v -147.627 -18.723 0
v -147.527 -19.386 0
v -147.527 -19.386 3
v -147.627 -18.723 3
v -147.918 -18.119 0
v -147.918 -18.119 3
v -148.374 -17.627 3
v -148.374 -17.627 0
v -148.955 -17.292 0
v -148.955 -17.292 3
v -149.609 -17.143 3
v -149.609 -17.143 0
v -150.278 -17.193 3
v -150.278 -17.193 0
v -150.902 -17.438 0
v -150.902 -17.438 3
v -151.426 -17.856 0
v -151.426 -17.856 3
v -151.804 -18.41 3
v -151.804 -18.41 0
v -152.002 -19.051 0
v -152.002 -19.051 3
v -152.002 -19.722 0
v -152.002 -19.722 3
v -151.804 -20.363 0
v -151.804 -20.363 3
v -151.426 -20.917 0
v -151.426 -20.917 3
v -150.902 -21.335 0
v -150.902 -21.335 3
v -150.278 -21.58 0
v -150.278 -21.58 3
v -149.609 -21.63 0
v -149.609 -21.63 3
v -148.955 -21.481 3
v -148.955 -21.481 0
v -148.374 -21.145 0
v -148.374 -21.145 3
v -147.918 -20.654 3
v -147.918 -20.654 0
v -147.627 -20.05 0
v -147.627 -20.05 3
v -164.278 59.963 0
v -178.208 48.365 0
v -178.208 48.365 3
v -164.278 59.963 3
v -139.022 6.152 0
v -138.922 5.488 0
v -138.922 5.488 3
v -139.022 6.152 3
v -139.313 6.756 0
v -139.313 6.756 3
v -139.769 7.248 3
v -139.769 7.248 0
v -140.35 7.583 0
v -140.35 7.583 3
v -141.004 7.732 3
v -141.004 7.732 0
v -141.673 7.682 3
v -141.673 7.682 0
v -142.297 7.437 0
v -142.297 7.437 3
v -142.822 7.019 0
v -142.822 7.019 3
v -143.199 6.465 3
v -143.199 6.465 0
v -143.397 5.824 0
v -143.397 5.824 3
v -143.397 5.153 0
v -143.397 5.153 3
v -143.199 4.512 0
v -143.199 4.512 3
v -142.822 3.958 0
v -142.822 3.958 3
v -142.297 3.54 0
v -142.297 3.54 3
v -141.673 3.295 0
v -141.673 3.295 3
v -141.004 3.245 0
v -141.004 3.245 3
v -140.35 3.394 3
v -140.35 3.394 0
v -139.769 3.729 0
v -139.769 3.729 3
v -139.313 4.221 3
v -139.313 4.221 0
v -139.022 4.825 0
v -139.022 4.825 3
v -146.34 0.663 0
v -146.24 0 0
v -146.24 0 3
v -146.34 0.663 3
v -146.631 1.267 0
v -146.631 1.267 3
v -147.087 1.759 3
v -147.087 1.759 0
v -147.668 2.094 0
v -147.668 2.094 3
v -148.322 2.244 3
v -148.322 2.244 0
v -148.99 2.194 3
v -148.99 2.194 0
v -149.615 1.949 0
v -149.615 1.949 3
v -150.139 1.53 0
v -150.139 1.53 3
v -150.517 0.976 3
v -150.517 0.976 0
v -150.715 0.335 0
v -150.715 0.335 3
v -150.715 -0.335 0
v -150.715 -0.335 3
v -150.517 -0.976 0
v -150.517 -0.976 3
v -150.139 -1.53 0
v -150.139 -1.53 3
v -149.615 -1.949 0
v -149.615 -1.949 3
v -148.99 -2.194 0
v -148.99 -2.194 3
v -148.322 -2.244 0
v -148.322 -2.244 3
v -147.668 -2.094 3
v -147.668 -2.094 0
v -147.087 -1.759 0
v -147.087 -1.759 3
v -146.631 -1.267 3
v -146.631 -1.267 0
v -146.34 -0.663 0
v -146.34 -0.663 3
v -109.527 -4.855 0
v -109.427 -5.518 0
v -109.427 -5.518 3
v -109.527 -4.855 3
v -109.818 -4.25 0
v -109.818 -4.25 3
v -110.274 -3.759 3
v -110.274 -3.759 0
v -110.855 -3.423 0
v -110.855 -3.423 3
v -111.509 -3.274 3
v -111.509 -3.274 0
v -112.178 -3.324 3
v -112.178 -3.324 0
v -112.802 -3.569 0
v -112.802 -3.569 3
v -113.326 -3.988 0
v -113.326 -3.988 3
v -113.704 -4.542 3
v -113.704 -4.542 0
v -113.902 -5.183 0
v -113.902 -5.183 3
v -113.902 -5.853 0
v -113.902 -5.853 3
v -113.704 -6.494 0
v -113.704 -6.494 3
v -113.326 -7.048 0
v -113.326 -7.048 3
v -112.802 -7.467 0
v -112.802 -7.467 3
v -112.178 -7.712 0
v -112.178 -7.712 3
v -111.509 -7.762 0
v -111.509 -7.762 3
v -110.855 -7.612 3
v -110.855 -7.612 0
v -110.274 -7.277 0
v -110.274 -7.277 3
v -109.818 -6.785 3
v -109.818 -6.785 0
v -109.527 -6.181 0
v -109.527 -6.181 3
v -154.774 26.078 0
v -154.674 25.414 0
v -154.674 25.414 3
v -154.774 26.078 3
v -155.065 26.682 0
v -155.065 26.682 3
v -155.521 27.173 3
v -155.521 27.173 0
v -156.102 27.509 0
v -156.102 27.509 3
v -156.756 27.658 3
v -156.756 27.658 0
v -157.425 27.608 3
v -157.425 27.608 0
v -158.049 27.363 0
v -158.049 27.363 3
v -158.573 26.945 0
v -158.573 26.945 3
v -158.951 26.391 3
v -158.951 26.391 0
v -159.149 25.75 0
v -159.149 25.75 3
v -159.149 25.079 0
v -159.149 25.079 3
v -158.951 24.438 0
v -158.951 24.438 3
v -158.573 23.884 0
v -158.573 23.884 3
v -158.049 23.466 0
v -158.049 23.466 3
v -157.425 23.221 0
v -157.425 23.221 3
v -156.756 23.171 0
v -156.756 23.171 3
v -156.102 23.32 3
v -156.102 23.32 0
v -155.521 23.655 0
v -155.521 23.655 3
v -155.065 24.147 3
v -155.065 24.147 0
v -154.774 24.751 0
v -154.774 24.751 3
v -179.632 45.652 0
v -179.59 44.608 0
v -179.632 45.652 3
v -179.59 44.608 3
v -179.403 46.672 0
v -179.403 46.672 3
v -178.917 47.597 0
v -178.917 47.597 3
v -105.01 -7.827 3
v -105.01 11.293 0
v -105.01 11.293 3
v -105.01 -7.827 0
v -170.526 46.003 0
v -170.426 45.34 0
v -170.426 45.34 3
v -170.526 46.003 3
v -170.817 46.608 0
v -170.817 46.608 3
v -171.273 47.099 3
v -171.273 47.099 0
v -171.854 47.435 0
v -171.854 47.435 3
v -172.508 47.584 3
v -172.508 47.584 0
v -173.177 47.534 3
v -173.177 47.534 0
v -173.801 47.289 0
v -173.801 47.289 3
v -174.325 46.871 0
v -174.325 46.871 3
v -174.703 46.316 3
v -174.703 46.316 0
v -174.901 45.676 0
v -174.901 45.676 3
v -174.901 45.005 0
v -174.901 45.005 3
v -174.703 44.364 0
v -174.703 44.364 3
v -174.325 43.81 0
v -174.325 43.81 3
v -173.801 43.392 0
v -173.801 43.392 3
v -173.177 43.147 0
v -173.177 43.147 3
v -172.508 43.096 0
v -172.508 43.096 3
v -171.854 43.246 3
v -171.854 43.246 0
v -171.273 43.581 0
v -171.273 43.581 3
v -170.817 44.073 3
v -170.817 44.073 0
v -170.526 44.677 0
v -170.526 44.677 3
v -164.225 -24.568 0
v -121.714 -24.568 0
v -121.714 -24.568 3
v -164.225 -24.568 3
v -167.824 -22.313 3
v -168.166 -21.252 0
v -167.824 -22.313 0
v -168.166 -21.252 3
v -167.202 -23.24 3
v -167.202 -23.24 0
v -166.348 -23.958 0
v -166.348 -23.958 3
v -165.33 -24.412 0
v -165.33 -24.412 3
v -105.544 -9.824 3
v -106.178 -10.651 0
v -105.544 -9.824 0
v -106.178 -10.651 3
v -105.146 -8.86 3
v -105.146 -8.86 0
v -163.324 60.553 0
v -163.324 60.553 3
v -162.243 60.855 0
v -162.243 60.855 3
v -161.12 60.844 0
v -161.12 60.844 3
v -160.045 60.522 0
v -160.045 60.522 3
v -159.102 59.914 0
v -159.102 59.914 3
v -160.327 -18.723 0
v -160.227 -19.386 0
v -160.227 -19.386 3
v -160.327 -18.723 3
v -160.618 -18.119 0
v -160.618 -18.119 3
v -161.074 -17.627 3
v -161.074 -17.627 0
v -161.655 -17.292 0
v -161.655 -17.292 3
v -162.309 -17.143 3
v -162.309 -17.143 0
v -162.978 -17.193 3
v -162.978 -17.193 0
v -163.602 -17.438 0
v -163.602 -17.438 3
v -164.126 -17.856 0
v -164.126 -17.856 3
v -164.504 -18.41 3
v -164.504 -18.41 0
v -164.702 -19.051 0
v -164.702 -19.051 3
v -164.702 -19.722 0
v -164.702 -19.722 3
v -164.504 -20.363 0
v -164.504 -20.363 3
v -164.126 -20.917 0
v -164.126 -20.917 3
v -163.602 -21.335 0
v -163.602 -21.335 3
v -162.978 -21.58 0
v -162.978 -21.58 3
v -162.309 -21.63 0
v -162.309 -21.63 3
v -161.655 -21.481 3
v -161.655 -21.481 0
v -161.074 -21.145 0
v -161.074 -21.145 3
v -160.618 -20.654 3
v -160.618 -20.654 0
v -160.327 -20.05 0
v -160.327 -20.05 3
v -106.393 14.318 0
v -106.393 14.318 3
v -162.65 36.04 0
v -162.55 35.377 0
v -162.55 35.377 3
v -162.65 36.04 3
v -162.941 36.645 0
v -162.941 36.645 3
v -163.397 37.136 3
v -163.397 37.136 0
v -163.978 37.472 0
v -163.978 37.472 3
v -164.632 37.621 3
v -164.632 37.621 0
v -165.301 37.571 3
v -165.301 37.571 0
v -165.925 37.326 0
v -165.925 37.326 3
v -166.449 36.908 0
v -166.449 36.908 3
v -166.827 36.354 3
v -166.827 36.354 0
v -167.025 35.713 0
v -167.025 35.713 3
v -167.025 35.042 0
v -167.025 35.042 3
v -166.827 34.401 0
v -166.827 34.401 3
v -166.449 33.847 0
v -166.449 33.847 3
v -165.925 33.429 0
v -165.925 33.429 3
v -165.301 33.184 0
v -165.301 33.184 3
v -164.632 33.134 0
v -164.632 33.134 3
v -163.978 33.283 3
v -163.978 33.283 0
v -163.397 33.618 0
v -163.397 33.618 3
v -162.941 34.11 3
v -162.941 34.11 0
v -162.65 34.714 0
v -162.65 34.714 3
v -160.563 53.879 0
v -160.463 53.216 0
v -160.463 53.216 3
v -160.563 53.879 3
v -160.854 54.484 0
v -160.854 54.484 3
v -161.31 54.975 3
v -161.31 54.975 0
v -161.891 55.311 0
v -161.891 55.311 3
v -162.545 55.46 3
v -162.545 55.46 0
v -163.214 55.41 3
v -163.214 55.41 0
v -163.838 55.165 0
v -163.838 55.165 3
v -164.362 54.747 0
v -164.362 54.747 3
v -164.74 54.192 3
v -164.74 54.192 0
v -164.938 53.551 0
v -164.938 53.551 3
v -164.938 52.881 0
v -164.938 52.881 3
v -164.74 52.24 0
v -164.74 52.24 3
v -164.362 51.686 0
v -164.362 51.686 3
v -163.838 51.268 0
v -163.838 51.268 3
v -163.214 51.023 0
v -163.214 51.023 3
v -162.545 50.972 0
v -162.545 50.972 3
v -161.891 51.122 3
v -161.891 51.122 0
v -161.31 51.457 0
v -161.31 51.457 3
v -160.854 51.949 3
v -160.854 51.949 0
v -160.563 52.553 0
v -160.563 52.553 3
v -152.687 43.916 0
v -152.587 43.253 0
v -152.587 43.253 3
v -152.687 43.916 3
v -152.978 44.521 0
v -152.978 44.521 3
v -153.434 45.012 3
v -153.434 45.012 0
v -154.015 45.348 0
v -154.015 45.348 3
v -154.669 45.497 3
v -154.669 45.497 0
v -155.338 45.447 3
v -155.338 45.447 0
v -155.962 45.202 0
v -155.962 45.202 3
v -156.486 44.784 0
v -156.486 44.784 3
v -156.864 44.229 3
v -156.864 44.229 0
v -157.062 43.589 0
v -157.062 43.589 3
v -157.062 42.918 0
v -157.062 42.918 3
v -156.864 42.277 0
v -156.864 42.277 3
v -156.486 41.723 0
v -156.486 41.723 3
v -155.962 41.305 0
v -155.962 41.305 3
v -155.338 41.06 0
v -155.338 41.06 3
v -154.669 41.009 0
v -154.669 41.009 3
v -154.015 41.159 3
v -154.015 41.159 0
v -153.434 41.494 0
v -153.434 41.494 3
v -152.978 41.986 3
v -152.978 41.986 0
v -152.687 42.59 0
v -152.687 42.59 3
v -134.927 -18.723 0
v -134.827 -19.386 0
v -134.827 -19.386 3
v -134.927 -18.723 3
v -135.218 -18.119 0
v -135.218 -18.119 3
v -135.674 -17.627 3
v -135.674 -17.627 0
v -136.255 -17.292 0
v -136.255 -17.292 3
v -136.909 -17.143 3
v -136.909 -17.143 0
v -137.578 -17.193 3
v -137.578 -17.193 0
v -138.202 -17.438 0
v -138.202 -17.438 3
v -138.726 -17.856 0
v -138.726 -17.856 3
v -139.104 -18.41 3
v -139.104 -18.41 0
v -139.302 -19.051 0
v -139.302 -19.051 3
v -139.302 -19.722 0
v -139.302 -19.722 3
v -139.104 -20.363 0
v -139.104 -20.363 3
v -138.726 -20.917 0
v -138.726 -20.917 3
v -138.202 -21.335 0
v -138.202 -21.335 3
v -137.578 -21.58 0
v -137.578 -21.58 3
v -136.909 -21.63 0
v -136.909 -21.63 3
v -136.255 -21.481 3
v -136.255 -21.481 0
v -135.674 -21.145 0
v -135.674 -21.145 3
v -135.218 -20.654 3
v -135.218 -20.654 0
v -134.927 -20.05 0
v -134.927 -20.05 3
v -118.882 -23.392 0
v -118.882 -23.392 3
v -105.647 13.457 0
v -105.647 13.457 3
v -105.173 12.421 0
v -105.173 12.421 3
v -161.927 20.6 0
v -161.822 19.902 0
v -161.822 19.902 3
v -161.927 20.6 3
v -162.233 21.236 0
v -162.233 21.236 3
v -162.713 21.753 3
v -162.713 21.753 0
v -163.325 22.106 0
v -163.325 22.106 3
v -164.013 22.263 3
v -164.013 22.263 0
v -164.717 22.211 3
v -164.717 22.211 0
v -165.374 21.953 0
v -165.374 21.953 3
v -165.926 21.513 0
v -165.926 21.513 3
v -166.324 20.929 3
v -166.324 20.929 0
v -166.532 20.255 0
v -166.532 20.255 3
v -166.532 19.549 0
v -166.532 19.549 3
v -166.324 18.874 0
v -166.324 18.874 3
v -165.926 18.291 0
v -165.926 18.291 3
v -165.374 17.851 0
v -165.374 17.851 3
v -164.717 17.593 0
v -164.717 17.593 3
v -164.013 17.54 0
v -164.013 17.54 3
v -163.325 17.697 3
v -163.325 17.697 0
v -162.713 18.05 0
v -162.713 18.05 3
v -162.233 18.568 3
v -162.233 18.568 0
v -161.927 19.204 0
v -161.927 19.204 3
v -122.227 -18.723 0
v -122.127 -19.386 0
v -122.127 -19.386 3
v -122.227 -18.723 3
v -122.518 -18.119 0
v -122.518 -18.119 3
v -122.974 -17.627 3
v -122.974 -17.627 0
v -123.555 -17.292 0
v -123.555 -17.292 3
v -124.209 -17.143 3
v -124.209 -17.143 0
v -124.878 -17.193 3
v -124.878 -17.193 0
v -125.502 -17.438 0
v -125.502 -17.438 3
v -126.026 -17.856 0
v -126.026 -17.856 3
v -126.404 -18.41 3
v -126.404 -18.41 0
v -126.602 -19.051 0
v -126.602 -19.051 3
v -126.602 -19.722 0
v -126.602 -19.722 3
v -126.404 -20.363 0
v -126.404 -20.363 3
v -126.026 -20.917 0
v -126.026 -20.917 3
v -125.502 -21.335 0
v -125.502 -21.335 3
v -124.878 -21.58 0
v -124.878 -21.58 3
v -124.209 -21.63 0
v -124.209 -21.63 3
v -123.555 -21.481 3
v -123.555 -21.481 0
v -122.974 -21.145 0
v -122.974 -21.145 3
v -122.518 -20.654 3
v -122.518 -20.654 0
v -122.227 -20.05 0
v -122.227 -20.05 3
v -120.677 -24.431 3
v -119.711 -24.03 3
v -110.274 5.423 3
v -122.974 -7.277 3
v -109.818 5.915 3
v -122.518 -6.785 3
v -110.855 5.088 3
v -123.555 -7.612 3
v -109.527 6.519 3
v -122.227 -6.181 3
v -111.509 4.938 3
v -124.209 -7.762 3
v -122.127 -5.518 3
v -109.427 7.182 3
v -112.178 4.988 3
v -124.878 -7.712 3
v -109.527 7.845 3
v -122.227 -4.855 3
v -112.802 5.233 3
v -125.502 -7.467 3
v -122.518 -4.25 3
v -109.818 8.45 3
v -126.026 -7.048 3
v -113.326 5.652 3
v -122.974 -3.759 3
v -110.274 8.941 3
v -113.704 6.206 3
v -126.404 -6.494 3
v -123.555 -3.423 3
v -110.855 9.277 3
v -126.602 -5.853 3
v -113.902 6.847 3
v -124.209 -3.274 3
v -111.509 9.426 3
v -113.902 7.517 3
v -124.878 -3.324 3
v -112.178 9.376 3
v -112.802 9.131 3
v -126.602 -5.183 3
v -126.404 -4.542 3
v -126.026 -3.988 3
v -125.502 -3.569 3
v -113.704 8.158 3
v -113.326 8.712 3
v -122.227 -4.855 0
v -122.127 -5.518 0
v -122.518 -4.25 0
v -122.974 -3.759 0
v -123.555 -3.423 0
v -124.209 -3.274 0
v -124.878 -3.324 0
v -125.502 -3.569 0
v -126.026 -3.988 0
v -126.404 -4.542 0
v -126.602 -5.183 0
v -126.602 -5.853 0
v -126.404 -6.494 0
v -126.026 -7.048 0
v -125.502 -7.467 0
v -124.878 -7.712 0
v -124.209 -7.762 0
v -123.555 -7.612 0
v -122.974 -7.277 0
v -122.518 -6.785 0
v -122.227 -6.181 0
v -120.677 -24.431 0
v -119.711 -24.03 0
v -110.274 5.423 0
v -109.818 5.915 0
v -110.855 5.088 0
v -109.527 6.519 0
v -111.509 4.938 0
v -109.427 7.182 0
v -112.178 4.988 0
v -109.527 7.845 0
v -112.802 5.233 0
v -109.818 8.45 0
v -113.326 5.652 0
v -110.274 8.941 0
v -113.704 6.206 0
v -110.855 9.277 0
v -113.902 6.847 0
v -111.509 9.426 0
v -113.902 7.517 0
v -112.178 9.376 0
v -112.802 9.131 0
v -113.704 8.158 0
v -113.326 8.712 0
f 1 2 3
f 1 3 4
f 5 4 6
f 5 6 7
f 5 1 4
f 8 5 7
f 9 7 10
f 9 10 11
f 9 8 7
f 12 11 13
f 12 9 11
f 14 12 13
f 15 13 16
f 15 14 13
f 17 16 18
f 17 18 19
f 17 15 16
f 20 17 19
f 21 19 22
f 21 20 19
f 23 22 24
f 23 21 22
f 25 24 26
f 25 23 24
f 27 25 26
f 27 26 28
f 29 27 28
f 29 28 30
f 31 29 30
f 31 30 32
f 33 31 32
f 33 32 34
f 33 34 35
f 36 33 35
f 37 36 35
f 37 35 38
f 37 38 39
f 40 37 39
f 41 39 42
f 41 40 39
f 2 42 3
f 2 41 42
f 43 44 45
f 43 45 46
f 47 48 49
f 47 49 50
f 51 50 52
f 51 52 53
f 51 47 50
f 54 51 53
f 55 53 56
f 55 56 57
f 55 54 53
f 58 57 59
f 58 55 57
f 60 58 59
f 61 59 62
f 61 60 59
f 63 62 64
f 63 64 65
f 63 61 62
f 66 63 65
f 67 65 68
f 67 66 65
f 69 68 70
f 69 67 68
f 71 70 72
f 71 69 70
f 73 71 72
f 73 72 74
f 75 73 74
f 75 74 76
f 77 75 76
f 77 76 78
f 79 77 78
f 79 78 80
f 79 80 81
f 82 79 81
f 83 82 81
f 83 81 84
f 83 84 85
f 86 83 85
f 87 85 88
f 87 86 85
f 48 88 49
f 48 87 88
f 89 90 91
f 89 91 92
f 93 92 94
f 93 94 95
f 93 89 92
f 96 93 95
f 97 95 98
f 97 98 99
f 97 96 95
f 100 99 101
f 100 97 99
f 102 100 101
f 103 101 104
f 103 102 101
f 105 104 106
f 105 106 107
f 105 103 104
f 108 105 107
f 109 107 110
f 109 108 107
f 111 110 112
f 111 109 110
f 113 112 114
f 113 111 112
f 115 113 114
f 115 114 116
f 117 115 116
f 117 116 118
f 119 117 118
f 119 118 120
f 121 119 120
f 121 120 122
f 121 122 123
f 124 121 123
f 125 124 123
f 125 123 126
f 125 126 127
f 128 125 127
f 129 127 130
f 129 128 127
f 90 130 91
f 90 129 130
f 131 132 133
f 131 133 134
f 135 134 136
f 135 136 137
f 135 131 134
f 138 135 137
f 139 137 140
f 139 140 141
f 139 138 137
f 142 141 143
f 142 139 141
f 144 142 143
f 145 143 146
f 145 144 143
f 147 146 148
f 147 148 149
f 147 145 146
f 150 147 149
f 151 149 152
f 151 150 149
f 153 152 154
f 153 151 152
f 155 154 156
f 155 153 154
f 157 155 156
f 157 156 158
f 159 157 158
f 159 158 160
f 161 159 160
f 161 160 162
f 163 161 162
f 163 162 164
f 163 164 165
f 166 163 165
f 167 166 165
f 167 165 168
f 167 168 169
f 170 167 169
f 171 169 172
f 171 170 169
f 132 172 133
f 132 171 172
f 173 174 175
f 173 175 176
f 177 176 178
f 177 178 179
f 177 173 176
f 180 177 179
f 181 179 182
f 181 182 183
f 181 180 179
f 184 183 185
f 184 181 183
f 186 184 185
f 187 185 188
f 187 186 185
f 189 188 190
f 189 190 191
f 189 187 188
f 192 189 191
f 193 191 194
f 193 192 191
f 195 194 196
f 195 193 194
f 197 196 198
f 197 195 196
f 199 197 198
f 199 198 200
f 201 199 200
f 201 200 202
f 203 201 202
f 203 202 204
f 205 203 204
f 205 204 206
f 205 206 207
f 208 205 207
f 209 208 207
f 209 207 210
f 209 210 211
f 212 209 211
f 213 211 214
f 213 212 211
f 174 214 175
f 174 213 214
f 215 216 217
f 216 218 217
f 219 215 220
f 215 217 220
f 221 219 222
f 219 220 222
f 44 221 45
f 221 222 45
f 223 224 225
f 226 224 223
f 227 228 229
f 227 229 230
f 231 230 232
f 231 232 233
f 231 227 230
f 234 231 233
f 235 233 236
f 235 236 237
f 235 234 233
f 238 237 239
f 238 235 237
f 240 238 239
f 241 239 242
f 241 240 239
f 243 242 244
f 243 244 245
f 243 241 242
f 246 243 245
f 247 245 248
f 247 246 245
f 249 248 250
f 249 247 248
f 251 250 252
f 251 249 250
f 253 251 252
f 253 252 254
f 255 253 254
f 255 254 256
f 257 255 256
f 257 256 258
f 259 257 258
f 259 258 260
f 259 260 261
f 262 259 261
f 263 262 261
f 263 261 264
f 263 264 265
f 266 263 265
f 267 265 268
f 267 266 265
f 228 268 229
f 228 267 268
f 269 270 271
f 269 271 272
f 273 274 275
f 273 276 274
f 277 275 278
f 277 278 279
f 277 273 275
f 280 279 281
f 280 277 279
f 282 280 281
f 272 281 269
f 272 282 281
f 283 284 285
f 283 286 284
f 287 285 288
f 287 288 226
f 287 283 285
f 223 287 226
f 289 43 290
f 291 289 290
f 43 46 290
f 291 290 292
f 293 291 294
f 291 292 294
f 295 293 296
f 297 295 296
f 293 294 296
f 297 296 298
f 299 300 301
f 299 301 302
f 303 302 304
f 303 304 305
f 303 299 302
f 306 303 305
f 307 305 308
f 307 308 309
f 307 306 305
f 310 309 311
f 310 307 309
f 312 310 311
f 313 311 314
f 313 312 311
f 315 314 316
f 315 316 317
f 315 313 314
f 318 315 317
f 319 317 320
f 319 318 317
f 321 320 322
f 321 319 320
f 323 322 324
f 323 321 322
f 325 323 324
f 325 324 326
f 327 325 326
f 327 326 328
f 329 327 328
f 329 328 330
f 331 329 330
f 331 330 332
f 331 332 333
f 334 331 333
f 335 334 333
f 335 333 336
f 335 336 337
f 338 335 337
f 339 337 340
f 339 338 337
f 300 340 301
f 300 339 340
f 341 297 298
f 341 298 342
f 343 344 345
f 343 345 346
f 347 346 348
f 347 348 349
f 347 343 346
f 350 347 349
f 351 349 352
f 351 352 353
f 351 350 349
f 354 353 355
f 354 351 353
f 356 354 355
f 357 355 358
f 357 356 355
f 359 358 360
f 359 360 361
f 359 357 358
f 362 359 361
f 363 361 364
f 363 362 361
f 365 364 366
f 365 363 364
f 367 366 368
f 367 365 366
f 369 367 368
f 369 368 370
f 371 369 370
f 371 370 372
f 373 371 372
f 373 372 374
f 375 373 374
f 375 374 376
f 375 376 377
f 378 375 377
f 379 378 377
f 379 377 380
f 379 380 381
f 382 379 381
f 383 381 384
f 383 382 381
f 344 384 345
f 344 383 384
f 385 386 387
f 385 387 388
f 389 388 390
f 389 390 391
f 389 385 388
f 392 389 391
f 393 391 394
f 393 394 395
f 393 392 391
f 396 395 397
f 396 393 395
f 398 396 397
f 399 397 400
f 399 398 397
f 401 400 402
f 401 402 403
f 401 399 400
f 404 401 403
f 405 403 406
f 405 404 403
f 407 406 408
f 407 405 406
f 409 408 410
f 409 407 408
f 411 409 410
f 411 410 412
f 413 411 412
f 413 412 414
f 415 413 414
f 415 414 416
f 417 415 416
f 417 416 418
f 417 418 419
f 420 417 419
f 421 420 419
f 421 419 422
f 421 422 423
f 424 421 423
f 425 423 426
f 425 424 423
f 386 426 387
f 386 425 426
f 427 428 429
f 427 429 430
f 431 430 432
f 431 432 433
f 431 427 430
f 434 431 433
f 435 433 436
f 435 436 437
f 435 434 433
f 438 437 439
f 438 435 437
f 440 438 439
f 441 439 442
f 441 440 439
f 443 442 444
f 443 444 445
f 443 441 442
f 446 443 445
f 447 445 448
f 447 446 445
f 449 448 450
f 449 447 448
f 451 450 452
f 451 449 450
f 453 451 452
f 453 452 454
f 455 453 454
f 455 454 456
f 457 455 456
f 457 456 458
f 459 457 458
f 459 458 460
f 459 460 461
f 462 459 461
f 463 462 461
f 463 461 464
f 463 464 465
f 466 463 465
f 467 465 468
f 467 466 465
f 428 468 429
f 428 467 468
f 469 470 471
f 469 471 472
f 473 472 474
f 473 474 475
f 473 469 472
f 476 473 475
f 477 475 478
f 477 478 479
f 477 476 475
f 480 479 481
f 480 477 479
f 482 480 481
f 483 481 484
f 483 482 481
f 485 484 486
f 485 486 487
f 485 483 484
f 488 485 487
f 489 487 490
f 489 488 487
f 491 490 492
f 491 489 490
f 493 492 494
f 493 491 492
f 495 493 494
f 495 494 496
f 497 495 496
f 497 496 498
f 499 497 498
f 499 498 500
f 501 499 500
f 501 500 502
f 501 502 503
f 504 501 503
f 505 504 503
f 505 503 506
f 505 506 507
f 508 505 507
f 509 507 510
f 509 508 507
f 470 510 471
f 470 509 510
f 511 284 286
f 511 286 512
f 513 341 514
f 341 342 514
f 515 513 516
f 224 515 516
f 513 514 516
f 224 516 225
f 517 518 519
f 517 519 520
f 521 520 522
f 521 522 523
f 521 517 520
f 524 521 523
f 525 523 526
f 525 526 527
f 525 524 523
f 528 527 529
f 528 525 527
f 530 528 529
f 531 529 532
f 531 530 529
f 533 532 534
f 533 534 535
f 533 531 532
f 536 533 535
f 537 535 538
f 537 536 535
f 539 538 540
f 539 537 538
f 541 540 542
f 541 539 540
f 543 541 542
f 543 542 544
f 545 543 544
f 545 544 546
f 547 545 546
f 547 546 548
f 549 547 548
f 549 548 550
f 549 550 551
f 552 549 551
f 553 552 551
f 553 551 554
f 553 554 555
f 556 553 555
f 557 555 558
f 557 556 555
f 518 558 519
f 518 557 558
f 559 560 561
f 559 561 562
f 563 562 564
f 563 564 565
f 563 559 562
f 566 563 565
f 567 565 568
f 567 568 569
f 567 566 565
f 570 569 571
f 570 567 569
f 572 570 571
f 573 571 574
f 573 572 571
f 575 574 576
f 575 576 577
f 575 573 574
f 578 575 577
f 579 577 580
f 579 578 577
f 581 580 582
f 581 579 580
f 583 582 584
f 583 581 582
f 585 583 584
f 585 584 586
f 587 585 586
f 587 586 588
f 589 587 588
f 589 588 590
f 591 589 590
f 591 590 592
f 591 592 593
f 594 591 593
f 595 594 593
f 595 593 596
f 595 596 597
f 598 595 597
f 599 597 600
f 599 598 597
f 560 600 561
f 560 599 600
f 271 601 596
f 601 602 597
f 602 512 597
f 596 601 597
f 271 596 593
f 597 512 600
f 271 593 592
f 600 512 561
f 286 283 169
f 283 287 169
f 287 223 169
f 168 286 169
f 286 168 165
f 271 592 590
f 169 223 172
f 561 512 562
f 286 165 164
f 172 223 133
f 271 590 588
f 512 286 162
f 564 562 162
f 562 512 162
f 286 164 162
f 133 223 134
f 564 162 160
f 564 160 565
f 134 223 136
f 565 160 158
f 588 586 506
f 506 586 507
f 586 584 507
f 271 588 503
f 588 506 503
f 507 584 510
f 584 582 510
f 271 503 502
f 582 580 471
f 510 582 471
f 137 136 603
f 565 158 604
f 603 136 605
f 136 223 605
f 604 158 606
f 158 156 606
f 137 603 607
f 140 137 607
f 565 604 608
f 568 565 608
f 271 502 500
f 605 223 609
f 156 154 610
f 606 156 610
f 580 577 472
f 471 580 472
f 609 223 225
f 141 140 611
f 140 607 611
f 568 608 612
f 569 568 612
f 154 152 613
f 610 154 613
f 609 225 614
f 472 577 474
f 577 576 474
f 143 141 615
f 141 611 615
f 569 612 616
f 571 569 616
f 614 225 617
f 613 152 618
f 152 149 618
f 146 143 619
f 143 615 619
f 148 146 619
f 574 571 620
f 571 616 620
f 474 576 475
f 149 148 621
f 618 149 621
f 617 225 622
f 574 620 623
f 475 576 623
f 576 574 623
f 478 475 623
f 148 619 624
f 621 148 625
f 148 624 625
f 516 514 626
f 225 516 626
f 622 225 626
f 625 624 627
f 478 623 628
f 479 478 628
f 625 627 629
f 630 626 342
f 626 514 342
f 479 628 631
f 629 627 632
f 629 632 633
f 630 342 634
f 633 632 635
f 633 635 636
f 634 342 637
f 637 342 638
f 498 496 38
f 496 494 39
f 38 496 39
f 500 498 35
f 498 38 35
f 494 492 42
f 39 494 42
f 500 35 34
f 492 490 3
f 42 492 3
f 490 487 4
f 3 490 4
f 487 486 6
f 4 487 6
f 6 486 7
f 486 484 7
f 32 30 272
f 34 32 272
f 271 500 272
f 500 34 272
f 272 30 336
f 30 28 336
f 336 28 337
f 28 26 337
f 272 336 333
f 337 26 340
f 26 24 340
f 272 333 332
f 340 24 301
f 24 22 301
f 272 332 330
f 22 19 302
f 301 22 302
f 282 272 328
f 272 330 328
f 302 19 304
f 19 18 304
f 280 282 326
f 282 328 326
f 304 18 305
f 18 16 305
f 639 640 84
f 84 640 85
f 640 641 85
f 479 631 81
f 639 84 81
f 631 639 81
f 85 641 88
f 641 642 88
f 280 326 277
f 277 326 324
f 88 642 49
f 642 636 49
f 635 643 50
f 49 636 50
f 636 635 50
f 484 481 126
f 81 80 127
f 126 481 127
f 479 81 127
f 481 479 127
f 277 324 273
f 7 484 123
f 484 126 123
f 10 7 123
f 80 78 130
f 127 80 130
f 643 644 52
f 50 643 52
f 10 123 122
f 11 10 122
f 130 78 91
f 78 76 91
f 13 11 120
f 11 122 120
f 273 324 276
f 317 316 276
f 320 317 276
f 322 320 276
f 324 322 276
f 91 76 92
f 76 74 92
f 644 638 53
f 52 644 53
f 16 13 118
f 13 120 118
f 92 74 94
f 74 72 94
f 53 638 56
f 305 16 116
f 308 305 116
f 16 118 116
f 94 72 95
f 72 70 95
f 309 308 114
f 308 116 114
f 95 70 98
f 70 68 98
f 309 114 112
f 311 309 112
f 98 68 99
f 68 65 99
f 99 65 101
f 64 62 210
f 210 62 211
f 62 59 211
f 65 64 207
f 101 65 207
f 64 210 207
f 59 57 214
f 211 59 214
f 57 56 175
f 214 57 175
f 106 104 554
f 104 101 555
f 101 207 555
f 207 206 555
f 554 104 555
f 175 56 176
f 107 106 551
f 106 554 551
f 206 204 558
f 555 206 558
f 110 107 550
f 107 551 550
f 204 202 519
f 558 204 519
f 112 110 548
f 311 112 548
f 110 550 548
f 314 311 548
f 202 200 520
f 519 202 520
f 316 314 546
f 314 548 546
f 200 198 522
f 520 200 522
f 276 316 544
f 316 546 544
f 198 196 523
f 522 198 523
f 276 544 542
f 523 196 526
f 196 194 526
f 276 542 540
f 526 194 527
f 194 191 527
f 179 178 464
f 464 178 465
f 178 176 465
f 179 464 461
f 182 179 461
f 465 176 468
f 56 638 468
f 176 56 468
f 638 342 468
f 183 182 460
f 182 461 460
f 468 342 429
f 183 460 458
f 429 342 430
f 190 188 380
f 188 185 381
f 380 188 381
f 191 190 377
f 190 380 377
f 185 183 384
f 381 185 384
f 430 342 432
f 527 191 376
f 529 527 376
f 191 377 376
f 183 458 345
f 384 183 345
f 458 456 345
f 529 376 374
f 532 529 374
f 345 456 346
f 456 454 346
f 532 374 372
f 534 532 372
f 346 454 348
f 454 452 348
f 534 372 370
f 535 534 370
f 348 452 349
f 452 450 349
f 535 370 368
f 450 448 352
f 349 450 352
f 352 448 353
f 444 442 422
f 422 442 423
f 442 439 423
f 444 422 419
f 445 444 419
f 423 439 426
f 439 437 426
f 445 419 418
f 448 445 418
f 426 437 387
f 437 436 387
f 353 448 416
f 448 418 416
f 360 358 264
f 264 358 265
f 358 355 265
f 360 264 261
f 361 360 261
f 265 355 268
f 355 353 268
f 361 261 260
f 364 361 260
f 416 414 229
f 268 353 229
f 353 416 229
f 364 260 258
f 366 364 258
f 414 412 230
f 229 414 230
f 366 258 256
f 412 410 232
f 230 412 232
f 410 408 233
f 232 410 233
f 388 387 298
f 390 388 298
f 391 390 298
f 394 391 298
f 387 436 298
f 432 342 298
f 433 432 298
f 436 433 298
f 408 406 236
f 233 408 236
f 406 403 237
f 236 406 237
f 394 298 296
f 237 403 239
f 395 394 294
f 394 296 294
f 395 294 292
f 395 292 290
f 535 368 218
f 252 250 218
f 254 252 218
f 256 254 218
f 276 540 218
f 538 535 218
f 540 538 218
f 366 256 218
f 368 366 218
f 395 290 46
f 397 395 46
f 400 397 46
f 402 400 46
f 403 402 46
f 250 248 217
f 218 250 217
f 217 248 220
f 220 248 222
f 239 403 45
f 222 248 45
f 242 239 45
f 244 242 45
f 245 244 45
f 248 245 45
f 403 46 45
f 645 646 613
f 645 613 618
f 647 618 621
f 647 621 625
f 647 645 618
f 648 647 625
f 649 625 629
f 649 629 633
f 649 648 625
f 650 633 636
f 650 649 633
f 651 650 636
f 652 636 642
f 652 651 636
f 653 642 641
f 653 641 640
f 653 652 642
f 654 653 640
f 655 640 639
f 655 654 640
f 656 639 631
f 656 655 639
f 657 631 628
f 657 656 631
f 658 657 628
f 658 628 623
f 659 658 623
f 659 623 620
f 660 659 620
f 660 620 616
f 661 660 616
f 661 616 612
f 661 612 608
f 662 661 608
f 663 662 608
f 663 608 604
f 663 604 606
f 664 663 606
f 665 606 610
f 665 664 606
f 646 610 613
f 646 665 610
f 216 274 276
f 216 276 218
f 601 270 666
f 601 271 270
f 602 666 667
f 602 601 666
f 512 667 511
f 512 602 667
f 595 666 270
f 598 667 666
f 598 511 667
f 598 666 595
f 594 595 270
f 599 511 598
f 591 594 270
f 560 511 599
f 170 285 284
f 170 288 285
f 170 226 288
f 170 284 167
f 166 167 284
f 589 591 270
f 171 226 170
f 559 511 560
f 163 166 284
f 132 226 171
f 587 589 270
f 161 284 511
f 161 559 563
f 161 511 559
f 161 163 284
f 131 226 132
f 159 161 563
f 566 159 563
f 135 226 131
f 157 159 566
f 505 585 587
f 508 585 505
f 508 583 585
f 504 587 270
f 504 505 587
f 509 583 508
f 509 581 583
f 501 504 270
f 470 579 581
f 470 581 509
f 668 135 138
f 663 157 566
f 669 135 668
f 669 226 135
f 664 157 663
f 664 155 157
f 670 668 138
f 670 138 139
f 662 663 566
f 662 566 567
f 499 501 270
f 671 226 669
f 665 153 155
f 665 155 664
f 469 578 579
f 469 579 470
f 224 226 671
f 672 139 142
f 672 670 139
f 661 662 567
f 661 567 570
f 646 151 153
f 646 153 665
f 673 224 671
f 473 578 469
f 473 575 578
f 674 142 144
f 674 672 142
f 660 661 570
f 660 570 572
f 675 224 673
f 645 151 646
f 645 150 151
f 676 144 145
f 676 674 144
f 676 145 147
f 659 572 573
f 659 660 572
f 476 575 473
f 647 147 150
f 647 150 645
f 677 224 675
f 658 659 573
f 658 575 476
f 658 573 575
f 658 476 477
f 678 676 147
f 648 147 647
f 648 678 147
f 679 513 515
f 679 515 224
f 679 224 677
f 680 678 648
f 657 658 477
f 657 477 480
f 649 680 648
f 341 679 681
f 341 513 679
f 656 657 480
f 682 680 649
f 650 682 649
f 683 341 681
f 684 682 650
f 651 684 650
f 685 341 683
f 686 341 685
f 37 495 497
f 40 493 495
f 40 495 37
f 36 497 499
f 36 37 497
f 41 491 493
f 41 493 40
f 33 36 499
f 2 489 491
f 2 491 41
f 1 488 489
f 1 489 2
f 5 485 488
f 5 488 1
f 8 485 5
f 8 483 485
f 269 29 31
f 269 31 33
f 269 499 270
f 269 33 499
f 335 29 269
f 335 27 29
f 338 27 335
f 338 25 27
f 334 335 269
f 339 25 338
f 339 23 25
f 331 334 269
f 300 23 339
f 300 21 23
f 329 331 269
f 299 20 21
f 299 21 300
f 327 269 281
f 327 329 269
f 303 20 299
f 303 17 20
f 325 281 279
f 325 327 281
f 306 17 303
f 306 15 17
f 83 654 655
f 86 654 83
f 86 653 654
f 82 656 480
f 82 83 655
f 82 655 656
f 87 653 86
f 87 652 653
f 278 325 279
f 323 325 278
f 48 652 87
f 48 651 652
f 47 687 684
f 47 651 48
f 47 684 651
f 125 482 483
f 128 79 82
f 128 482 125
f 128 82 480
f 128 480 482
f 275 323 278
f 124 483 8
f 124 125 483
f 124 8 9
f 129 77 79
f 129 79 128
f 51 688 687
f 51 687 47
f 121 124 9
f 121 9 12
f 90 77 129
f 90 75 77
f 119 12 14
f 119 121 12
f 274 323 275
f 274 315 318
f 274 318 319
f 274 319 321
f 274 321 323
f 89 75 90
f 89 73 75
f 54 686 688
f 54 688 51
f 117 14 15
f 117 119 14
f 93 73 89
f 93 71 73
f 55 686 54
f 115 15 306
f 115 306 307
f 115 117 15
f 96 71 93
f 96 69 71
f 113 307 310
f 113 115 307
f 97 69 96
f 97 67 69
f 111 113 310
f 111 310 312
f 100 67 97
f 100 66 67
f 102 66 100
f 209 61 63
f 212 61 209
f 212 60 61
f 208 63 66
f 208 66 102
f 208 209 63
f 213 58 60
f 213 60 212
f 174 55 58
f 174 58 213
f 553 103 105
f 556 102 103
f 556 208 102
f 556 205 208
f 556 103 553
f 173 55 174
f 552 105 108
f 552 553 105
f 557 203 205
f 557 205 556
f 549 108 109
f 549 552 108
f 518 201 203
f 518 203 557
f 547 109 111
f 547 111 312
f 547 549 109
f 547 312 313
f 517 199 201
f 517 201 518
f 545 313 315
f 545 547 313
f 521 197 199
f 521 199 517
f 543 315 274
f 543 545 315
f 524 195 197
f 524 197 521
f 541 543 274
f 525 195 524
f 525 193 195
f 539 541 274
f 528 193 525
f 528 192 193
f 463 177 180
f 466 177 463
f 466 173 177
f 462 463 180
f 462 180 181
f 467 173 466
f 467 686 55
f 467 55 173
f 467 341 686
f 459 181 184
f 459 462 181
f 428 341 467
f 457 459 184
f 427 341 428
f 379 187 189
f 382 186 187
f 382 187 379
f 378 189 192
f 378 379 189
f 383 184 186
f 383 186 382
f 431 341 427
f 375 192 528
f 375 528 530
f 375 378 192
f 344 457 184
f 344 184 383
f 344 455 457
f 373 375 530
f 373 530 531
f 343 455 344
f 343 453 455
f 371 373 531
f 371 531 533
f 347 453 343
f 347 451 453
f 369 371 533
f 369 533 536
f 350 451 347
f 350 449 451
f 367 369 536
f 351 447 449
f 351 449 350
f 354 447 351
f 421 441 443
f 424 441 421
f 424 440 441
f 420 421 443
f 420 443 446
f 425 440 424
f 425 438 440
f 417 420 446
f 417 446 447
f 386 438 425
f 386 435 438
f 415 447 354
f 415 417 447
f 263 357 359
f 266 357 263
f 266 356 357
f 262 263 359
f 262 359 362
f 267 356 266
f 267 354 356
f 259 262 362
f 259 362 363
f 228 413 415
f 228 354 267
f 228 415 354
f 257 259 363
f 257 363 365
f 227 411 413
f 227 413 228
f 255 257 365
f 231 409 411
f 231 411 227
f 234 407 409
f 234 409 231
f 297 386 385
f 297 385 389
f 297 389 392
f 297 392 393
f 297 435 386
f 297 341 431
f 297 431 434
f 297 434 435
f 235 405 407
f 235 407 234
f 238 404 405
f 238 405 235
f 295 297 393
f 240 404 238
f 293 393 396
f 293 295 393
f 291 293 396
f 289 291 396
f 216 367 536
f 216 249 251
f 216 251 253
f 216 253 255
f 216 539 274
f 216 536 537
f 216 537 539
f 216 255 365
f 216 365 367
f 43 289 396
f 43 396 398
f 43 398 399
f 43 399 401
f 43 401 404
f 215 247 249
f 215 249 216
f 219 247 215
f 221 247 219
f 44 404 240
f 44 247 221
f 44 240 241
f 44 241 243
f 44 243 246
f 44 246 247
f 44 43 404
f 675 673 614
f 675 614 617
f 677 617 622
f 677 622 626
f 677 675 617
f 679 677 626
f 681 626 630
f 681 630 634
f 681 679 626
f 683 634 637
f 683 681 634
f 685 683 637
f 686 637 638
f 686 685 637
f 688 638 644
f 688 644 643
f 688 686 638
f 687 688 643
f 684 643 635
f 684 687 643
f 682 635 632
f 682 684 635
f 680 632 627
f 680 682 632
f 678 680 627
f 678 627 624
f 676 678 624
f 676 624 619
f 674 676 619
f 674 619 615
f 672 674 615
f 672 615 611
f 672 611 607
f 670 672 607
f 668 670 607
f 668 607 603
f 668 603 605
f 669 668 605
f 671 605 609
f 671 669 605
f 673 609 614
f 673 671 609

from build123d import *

# Parameters (mm, degrees)
SKETCH_2_R      = 2.25
SKETCH_2_R_2    = 2.368301068
EXTRUDE_2_DEPTH = 3
FILLET_2_R      = 4


with BuildPart() as part:
    # 草图2 → 凸台-拉伸2 (new body)
    with BuildSketch(Plane.XY):
        Polygon((-167.590783161, -24.567963054), (-179.98483895, 46.885925983), (-161.669401762, 62.135536129), (-105.010365497, 13.121555122), (-105.010365497, -9.480363054), (-120.053839996, -24.567963054), align=None)
        with Locations((-154.836997815, 43.253183089)):
            Circle(SKETCH_2_R, mode=Mode.SUBTRACT)
        with Locations((-164.79992885, 35.377270114)):
            Circle(SKETCH_2_R, mode=Mode.SUBTRACT)
        with Locations((-162.712910791, 53.216114124)):
            Circle(SKETCH_2_R, mode=Mode.SUBTRACT)
        with Locations((-172.675841825, 45.340201148)):
            Circle(SKETCH_2_R, mode=Mode.SUBTRACT)
        with Locations((-111.676854941, 7.182036946)):
            Circle(SKETCH_2_R, mode=Mode.SUBTRACT)
        with Locations((-124.376854941, -5.517963054)):
            Circle(SKETCH_2_R, mode=Mode.SUBTRACT)
        with Locations((-124.376854941, -19.386363054)):
            Circle(SKETCH_2_R, mode=Mode.SUBTRACT)
        with Locations((-137.076854941, -19.386363054)):
            Circle(SKETCH_2_R, mode=Mode.SUBTRACT)
        with Locations((-149.776854941, -19.386363054)):
            Circle(SKETCH_2_R, mode=Mode.SUBTRACT)
        with Locations((-162.476854941, -19.386363054)):
            Circle(SKETCH_2_R, mode=Mode.SUBTRACT)
        with Locations((-141.172189922, 5.48847701)):
            Circle(SKETCH_2_R, mode=Mode.SUBTRACT)
        with Locations((-148.489740206, 0)):
            Circle(SKETCH_2_R, mode=Mode.SUBTRACT)
        with Locations((-156.924015874, 25.414339079)):
            Circle(SKETCH_2_R, mode=Mode.SUBTRACT)
        with Locations((-164.189999825, 19.901668358)):
            Circle(SKETCH_2_R_2, mode=Mode.SUBTRACT)
        with Locations((-111.676854941, -5.517963054)):
            Circle(SKETCH_2_R, mode=Mode.SUBTRACT)
    extrude(amount=EXTRUDE_2_DEPTH)

    # 圆角2
    fillet_2_edges = [part.edges().sort_by_distance(p)[0] for p in [
        (-120.053839996, -24.567963054, 1.5),
        (-167.590783161, -24.567963054, 1.5),
        (-179.98483895, 46.885925983, 1.5),
        (-161.669401762, 62.135536129, 1.5),
        (-105.010365497, 13.121555122, 1.5),
        (-105.010365497, -9.480363054, 1.5),
    ]]
    fillet(fillet_2_edges, radius=FILLET_2_R)


solid = part.part
